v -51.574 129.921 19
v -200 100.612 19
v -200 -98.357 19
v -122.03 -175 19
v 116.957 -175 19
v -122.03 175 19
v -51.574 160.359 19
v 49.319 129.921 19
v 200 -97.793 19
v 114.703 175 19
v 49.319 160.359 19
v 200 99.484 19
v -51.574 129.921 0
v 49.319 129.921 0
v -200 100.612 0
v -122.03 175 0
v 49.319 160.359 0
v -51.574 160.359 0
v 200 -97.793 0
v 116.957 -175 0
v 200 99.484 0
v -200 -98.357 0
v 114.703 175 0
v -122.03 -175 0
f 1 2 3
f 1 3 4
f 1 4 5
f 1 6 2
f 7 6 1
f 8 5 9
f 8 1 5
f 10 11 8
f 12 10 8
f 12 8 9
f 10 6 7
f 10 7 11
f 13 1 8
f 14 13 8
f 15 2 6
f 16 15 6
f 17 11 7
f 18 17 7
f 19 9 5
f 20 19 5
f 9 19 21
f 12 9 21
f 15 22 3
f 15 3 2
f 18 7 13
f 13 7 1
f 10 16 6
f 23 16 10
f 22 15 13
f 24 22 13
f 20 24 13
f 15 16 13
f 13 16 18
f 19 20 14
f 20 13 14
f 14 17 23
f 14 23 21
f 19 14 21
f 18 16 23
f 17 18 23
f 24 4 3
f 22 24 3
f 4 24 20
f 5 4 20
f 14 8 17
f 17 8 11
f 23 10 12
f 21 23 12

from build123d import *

# Parameters (mm, degrees)
F0_W     = 400
F0_H     = 350
F1_DEPTH = 19
F3_DEPTH = 19.001
F5_DEPTH = 19.001


with BuildPart() as f1:
    # F0 (on Top) → F1 (new body)
    with BuildSketch(Plane.XY):
        Rectangle(F0_W, F0_H)
    extrude(amount=F1_DEPTH)

    # F2 (on face) → F3 (cut, through all)
    with BuildSketch(Plane.XY.offset(19)):
        Polygon((-200, 175), (-200, 100.611582), (-122.030288, 175), align=None)
        Polygon((200, 175), (114.702843, 175), (200, 99.48428), align=None)
        Polygon((200, -97.793318), (116.957434, -175), (200, -175), align=None)
        Polygon((-122.030288, -175), (-200, -98.356977), (-200, -175), align=None)
    extrude(amount=-F3_DEPTH, mode=Mode.SUBTRACT)

    # F4 (on face) → F5 (cut, through all)
    with BuildSketch(Plane.XY.offset(19)):
        Polygon((-51.574003, 160.358503), (-51.574003, 129.921392), (49.319401, 129.921392), (49.319401, 160.358503), (39.737348, 160.358503), align=None)
    extrude(amount=-F5_DEPTH, mode=Mode.SUBTRACT)


solid = f1.part
